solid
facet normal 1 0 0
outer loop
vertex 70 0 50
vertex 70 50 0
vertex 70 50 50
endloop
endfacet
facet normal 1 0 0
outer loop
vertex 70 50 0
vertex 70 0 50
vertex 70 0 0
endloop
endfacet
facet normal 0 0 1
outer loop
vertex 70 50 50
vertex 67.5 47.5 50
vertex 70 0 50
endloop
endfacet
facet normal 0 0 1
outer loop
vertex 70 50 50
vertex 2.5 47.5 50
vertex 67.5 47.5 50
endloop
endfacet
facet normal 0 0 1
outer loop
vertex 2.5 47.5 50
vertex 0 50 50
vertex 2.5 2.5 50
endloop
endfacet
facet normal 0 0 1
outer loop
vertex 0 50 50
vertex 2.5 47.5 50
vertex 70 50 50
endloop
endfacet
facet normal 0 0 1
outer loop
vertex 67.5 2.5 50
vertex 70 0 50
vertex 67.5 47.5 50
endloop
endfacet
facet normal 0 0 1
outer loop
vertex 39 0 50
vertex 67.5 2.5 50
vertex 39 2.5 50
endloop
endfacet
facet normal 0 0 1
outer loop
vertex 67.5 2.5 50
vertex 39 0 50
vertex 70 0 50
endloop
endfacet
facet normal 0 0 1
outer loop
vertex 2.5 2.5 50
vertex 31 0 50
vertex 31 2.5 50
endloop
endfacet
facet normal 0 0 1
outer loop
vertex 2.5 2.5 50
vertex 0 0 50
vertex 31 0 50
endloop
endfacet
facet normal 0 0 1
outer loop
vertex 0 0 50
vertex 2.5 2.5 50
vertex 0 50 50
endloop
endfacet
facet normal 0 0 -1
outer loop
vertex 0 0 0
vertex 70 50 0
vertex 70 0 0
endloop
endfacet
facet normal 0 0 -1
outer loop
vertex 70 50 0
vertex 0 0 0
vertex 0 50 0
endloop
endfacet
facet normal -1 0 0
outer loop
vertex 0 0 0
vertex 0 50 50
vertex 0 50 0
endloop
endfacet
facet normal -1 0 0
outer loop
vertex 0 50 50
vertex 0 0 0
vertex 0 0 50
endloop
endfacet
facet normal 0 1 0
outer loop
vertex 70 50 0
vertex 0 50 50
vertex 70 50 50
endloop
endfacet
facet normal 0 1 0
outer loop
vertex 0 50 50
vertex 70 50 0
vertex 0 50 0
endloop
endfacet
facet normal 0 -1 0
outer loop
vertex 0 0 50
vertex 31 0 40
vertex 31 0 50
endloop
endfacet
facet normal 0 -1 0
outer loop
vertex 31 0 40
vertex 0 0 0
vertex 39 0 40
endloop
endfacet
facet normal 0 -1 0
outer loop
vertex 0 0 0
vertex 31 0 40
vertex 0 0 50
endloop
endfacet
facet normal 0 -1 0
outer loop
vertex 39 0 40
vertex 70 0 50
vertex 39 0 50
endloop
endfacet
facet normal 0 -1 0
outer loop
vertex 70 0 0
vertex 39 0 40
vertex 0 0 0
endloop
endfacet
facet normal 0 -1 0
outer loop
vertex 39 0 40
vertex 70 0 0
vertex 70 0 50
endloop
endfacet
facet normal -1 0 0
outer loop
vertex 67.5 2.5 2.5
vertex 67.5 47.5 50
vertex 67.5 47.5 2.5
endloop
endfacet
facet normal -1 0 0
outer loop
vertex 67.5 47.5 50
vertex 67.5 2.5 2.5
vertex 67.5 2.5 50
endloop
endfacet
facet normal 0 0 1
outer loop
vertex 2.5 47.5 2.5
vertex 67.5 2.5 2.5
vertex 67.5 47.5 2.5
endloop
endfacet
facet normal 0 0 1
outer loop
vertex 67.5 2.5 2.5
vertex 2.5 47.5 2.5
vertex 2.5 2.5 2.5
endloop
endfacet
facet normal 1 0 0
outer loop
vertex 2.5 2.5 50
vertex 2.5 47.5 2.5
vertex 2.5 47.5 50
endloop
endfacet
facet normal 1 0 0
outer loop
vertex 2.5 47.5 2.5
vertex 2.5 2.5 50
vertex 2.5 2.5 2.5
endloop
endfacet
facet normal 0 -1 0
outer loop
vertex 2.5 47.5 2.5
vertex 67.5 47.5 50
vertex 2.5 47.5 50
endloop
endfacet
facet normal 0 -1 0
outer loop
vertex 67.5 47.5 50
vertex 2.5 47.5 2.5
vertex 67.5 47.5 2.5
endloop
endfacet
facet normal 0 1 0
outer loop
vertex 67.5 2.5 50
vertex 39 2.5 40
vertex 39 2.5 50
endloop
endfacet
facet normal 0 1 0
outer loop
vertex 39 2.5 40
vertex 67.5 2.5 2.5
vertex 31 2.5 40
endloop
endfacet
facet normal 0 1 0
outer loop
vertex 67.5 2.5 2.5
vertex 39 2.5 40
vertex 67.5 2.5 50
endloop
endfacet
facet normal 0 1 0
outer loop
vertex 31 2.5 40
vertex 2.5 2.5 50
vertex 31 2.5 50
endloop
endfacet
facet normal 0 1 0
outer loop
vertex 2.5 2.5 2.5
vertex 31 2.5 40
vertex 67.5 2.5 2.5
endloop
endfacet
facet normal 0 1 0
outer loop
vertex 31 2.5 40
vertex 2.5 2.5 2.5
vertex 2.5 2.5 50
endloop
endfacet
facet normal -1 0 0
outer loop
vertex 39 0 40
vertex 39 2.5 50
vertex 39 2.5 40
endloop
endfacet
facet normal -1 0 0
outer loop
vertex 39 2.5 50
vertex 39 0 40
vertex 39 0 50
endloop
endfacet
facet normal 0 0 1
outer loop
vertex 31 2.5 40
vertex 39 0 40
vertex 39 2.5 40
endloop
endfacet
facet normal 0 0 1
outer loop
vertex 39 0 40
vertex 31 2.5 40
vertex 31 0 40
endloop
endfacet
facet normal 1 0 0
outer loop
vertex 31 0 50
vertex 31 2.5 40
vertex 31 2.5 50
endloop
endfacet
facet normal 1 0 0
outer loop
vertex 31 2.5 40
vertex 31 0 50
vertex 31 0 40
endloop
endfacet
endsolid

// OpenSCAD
$fn = 32;

// ----------------------------------------------------------------------
// Enclosure box: notch enclosure
// ----------------------------------------------------------------------

// --- parameters (mm) ---
box_l = 70;               // outer length, X
box_w = 50;               // outer width, Y
box_h = 50;               // outer height
wall_t = 2.5;             // wall thickness
notch_w = 8;              // cable notch width
notch_h = 10;             // cable notch height
fit_tol = 0.05;           // tolerance for press fits, mm
free_tol = 0.2;           // tolerance for clearance fits, mm

inner_h = box_h - wall_t;  // cavity depth
boss_h = inner_h - 2;  // corner boss height

difference() {
  union() {
    difference() {
      cube([box_l, box_w, box_h]);
      translate([wall_t, wall_t, wall_t])
        cube([box_l - 2 * wall_t, box_w - 2 * wall_t, box_h]);
    }
  }
  translate([box_l / 2 - notch_w / 2, -1, box_h - notch_h])
    cube([notch_w, wall_t + 2, notch_h + 1]);
}
